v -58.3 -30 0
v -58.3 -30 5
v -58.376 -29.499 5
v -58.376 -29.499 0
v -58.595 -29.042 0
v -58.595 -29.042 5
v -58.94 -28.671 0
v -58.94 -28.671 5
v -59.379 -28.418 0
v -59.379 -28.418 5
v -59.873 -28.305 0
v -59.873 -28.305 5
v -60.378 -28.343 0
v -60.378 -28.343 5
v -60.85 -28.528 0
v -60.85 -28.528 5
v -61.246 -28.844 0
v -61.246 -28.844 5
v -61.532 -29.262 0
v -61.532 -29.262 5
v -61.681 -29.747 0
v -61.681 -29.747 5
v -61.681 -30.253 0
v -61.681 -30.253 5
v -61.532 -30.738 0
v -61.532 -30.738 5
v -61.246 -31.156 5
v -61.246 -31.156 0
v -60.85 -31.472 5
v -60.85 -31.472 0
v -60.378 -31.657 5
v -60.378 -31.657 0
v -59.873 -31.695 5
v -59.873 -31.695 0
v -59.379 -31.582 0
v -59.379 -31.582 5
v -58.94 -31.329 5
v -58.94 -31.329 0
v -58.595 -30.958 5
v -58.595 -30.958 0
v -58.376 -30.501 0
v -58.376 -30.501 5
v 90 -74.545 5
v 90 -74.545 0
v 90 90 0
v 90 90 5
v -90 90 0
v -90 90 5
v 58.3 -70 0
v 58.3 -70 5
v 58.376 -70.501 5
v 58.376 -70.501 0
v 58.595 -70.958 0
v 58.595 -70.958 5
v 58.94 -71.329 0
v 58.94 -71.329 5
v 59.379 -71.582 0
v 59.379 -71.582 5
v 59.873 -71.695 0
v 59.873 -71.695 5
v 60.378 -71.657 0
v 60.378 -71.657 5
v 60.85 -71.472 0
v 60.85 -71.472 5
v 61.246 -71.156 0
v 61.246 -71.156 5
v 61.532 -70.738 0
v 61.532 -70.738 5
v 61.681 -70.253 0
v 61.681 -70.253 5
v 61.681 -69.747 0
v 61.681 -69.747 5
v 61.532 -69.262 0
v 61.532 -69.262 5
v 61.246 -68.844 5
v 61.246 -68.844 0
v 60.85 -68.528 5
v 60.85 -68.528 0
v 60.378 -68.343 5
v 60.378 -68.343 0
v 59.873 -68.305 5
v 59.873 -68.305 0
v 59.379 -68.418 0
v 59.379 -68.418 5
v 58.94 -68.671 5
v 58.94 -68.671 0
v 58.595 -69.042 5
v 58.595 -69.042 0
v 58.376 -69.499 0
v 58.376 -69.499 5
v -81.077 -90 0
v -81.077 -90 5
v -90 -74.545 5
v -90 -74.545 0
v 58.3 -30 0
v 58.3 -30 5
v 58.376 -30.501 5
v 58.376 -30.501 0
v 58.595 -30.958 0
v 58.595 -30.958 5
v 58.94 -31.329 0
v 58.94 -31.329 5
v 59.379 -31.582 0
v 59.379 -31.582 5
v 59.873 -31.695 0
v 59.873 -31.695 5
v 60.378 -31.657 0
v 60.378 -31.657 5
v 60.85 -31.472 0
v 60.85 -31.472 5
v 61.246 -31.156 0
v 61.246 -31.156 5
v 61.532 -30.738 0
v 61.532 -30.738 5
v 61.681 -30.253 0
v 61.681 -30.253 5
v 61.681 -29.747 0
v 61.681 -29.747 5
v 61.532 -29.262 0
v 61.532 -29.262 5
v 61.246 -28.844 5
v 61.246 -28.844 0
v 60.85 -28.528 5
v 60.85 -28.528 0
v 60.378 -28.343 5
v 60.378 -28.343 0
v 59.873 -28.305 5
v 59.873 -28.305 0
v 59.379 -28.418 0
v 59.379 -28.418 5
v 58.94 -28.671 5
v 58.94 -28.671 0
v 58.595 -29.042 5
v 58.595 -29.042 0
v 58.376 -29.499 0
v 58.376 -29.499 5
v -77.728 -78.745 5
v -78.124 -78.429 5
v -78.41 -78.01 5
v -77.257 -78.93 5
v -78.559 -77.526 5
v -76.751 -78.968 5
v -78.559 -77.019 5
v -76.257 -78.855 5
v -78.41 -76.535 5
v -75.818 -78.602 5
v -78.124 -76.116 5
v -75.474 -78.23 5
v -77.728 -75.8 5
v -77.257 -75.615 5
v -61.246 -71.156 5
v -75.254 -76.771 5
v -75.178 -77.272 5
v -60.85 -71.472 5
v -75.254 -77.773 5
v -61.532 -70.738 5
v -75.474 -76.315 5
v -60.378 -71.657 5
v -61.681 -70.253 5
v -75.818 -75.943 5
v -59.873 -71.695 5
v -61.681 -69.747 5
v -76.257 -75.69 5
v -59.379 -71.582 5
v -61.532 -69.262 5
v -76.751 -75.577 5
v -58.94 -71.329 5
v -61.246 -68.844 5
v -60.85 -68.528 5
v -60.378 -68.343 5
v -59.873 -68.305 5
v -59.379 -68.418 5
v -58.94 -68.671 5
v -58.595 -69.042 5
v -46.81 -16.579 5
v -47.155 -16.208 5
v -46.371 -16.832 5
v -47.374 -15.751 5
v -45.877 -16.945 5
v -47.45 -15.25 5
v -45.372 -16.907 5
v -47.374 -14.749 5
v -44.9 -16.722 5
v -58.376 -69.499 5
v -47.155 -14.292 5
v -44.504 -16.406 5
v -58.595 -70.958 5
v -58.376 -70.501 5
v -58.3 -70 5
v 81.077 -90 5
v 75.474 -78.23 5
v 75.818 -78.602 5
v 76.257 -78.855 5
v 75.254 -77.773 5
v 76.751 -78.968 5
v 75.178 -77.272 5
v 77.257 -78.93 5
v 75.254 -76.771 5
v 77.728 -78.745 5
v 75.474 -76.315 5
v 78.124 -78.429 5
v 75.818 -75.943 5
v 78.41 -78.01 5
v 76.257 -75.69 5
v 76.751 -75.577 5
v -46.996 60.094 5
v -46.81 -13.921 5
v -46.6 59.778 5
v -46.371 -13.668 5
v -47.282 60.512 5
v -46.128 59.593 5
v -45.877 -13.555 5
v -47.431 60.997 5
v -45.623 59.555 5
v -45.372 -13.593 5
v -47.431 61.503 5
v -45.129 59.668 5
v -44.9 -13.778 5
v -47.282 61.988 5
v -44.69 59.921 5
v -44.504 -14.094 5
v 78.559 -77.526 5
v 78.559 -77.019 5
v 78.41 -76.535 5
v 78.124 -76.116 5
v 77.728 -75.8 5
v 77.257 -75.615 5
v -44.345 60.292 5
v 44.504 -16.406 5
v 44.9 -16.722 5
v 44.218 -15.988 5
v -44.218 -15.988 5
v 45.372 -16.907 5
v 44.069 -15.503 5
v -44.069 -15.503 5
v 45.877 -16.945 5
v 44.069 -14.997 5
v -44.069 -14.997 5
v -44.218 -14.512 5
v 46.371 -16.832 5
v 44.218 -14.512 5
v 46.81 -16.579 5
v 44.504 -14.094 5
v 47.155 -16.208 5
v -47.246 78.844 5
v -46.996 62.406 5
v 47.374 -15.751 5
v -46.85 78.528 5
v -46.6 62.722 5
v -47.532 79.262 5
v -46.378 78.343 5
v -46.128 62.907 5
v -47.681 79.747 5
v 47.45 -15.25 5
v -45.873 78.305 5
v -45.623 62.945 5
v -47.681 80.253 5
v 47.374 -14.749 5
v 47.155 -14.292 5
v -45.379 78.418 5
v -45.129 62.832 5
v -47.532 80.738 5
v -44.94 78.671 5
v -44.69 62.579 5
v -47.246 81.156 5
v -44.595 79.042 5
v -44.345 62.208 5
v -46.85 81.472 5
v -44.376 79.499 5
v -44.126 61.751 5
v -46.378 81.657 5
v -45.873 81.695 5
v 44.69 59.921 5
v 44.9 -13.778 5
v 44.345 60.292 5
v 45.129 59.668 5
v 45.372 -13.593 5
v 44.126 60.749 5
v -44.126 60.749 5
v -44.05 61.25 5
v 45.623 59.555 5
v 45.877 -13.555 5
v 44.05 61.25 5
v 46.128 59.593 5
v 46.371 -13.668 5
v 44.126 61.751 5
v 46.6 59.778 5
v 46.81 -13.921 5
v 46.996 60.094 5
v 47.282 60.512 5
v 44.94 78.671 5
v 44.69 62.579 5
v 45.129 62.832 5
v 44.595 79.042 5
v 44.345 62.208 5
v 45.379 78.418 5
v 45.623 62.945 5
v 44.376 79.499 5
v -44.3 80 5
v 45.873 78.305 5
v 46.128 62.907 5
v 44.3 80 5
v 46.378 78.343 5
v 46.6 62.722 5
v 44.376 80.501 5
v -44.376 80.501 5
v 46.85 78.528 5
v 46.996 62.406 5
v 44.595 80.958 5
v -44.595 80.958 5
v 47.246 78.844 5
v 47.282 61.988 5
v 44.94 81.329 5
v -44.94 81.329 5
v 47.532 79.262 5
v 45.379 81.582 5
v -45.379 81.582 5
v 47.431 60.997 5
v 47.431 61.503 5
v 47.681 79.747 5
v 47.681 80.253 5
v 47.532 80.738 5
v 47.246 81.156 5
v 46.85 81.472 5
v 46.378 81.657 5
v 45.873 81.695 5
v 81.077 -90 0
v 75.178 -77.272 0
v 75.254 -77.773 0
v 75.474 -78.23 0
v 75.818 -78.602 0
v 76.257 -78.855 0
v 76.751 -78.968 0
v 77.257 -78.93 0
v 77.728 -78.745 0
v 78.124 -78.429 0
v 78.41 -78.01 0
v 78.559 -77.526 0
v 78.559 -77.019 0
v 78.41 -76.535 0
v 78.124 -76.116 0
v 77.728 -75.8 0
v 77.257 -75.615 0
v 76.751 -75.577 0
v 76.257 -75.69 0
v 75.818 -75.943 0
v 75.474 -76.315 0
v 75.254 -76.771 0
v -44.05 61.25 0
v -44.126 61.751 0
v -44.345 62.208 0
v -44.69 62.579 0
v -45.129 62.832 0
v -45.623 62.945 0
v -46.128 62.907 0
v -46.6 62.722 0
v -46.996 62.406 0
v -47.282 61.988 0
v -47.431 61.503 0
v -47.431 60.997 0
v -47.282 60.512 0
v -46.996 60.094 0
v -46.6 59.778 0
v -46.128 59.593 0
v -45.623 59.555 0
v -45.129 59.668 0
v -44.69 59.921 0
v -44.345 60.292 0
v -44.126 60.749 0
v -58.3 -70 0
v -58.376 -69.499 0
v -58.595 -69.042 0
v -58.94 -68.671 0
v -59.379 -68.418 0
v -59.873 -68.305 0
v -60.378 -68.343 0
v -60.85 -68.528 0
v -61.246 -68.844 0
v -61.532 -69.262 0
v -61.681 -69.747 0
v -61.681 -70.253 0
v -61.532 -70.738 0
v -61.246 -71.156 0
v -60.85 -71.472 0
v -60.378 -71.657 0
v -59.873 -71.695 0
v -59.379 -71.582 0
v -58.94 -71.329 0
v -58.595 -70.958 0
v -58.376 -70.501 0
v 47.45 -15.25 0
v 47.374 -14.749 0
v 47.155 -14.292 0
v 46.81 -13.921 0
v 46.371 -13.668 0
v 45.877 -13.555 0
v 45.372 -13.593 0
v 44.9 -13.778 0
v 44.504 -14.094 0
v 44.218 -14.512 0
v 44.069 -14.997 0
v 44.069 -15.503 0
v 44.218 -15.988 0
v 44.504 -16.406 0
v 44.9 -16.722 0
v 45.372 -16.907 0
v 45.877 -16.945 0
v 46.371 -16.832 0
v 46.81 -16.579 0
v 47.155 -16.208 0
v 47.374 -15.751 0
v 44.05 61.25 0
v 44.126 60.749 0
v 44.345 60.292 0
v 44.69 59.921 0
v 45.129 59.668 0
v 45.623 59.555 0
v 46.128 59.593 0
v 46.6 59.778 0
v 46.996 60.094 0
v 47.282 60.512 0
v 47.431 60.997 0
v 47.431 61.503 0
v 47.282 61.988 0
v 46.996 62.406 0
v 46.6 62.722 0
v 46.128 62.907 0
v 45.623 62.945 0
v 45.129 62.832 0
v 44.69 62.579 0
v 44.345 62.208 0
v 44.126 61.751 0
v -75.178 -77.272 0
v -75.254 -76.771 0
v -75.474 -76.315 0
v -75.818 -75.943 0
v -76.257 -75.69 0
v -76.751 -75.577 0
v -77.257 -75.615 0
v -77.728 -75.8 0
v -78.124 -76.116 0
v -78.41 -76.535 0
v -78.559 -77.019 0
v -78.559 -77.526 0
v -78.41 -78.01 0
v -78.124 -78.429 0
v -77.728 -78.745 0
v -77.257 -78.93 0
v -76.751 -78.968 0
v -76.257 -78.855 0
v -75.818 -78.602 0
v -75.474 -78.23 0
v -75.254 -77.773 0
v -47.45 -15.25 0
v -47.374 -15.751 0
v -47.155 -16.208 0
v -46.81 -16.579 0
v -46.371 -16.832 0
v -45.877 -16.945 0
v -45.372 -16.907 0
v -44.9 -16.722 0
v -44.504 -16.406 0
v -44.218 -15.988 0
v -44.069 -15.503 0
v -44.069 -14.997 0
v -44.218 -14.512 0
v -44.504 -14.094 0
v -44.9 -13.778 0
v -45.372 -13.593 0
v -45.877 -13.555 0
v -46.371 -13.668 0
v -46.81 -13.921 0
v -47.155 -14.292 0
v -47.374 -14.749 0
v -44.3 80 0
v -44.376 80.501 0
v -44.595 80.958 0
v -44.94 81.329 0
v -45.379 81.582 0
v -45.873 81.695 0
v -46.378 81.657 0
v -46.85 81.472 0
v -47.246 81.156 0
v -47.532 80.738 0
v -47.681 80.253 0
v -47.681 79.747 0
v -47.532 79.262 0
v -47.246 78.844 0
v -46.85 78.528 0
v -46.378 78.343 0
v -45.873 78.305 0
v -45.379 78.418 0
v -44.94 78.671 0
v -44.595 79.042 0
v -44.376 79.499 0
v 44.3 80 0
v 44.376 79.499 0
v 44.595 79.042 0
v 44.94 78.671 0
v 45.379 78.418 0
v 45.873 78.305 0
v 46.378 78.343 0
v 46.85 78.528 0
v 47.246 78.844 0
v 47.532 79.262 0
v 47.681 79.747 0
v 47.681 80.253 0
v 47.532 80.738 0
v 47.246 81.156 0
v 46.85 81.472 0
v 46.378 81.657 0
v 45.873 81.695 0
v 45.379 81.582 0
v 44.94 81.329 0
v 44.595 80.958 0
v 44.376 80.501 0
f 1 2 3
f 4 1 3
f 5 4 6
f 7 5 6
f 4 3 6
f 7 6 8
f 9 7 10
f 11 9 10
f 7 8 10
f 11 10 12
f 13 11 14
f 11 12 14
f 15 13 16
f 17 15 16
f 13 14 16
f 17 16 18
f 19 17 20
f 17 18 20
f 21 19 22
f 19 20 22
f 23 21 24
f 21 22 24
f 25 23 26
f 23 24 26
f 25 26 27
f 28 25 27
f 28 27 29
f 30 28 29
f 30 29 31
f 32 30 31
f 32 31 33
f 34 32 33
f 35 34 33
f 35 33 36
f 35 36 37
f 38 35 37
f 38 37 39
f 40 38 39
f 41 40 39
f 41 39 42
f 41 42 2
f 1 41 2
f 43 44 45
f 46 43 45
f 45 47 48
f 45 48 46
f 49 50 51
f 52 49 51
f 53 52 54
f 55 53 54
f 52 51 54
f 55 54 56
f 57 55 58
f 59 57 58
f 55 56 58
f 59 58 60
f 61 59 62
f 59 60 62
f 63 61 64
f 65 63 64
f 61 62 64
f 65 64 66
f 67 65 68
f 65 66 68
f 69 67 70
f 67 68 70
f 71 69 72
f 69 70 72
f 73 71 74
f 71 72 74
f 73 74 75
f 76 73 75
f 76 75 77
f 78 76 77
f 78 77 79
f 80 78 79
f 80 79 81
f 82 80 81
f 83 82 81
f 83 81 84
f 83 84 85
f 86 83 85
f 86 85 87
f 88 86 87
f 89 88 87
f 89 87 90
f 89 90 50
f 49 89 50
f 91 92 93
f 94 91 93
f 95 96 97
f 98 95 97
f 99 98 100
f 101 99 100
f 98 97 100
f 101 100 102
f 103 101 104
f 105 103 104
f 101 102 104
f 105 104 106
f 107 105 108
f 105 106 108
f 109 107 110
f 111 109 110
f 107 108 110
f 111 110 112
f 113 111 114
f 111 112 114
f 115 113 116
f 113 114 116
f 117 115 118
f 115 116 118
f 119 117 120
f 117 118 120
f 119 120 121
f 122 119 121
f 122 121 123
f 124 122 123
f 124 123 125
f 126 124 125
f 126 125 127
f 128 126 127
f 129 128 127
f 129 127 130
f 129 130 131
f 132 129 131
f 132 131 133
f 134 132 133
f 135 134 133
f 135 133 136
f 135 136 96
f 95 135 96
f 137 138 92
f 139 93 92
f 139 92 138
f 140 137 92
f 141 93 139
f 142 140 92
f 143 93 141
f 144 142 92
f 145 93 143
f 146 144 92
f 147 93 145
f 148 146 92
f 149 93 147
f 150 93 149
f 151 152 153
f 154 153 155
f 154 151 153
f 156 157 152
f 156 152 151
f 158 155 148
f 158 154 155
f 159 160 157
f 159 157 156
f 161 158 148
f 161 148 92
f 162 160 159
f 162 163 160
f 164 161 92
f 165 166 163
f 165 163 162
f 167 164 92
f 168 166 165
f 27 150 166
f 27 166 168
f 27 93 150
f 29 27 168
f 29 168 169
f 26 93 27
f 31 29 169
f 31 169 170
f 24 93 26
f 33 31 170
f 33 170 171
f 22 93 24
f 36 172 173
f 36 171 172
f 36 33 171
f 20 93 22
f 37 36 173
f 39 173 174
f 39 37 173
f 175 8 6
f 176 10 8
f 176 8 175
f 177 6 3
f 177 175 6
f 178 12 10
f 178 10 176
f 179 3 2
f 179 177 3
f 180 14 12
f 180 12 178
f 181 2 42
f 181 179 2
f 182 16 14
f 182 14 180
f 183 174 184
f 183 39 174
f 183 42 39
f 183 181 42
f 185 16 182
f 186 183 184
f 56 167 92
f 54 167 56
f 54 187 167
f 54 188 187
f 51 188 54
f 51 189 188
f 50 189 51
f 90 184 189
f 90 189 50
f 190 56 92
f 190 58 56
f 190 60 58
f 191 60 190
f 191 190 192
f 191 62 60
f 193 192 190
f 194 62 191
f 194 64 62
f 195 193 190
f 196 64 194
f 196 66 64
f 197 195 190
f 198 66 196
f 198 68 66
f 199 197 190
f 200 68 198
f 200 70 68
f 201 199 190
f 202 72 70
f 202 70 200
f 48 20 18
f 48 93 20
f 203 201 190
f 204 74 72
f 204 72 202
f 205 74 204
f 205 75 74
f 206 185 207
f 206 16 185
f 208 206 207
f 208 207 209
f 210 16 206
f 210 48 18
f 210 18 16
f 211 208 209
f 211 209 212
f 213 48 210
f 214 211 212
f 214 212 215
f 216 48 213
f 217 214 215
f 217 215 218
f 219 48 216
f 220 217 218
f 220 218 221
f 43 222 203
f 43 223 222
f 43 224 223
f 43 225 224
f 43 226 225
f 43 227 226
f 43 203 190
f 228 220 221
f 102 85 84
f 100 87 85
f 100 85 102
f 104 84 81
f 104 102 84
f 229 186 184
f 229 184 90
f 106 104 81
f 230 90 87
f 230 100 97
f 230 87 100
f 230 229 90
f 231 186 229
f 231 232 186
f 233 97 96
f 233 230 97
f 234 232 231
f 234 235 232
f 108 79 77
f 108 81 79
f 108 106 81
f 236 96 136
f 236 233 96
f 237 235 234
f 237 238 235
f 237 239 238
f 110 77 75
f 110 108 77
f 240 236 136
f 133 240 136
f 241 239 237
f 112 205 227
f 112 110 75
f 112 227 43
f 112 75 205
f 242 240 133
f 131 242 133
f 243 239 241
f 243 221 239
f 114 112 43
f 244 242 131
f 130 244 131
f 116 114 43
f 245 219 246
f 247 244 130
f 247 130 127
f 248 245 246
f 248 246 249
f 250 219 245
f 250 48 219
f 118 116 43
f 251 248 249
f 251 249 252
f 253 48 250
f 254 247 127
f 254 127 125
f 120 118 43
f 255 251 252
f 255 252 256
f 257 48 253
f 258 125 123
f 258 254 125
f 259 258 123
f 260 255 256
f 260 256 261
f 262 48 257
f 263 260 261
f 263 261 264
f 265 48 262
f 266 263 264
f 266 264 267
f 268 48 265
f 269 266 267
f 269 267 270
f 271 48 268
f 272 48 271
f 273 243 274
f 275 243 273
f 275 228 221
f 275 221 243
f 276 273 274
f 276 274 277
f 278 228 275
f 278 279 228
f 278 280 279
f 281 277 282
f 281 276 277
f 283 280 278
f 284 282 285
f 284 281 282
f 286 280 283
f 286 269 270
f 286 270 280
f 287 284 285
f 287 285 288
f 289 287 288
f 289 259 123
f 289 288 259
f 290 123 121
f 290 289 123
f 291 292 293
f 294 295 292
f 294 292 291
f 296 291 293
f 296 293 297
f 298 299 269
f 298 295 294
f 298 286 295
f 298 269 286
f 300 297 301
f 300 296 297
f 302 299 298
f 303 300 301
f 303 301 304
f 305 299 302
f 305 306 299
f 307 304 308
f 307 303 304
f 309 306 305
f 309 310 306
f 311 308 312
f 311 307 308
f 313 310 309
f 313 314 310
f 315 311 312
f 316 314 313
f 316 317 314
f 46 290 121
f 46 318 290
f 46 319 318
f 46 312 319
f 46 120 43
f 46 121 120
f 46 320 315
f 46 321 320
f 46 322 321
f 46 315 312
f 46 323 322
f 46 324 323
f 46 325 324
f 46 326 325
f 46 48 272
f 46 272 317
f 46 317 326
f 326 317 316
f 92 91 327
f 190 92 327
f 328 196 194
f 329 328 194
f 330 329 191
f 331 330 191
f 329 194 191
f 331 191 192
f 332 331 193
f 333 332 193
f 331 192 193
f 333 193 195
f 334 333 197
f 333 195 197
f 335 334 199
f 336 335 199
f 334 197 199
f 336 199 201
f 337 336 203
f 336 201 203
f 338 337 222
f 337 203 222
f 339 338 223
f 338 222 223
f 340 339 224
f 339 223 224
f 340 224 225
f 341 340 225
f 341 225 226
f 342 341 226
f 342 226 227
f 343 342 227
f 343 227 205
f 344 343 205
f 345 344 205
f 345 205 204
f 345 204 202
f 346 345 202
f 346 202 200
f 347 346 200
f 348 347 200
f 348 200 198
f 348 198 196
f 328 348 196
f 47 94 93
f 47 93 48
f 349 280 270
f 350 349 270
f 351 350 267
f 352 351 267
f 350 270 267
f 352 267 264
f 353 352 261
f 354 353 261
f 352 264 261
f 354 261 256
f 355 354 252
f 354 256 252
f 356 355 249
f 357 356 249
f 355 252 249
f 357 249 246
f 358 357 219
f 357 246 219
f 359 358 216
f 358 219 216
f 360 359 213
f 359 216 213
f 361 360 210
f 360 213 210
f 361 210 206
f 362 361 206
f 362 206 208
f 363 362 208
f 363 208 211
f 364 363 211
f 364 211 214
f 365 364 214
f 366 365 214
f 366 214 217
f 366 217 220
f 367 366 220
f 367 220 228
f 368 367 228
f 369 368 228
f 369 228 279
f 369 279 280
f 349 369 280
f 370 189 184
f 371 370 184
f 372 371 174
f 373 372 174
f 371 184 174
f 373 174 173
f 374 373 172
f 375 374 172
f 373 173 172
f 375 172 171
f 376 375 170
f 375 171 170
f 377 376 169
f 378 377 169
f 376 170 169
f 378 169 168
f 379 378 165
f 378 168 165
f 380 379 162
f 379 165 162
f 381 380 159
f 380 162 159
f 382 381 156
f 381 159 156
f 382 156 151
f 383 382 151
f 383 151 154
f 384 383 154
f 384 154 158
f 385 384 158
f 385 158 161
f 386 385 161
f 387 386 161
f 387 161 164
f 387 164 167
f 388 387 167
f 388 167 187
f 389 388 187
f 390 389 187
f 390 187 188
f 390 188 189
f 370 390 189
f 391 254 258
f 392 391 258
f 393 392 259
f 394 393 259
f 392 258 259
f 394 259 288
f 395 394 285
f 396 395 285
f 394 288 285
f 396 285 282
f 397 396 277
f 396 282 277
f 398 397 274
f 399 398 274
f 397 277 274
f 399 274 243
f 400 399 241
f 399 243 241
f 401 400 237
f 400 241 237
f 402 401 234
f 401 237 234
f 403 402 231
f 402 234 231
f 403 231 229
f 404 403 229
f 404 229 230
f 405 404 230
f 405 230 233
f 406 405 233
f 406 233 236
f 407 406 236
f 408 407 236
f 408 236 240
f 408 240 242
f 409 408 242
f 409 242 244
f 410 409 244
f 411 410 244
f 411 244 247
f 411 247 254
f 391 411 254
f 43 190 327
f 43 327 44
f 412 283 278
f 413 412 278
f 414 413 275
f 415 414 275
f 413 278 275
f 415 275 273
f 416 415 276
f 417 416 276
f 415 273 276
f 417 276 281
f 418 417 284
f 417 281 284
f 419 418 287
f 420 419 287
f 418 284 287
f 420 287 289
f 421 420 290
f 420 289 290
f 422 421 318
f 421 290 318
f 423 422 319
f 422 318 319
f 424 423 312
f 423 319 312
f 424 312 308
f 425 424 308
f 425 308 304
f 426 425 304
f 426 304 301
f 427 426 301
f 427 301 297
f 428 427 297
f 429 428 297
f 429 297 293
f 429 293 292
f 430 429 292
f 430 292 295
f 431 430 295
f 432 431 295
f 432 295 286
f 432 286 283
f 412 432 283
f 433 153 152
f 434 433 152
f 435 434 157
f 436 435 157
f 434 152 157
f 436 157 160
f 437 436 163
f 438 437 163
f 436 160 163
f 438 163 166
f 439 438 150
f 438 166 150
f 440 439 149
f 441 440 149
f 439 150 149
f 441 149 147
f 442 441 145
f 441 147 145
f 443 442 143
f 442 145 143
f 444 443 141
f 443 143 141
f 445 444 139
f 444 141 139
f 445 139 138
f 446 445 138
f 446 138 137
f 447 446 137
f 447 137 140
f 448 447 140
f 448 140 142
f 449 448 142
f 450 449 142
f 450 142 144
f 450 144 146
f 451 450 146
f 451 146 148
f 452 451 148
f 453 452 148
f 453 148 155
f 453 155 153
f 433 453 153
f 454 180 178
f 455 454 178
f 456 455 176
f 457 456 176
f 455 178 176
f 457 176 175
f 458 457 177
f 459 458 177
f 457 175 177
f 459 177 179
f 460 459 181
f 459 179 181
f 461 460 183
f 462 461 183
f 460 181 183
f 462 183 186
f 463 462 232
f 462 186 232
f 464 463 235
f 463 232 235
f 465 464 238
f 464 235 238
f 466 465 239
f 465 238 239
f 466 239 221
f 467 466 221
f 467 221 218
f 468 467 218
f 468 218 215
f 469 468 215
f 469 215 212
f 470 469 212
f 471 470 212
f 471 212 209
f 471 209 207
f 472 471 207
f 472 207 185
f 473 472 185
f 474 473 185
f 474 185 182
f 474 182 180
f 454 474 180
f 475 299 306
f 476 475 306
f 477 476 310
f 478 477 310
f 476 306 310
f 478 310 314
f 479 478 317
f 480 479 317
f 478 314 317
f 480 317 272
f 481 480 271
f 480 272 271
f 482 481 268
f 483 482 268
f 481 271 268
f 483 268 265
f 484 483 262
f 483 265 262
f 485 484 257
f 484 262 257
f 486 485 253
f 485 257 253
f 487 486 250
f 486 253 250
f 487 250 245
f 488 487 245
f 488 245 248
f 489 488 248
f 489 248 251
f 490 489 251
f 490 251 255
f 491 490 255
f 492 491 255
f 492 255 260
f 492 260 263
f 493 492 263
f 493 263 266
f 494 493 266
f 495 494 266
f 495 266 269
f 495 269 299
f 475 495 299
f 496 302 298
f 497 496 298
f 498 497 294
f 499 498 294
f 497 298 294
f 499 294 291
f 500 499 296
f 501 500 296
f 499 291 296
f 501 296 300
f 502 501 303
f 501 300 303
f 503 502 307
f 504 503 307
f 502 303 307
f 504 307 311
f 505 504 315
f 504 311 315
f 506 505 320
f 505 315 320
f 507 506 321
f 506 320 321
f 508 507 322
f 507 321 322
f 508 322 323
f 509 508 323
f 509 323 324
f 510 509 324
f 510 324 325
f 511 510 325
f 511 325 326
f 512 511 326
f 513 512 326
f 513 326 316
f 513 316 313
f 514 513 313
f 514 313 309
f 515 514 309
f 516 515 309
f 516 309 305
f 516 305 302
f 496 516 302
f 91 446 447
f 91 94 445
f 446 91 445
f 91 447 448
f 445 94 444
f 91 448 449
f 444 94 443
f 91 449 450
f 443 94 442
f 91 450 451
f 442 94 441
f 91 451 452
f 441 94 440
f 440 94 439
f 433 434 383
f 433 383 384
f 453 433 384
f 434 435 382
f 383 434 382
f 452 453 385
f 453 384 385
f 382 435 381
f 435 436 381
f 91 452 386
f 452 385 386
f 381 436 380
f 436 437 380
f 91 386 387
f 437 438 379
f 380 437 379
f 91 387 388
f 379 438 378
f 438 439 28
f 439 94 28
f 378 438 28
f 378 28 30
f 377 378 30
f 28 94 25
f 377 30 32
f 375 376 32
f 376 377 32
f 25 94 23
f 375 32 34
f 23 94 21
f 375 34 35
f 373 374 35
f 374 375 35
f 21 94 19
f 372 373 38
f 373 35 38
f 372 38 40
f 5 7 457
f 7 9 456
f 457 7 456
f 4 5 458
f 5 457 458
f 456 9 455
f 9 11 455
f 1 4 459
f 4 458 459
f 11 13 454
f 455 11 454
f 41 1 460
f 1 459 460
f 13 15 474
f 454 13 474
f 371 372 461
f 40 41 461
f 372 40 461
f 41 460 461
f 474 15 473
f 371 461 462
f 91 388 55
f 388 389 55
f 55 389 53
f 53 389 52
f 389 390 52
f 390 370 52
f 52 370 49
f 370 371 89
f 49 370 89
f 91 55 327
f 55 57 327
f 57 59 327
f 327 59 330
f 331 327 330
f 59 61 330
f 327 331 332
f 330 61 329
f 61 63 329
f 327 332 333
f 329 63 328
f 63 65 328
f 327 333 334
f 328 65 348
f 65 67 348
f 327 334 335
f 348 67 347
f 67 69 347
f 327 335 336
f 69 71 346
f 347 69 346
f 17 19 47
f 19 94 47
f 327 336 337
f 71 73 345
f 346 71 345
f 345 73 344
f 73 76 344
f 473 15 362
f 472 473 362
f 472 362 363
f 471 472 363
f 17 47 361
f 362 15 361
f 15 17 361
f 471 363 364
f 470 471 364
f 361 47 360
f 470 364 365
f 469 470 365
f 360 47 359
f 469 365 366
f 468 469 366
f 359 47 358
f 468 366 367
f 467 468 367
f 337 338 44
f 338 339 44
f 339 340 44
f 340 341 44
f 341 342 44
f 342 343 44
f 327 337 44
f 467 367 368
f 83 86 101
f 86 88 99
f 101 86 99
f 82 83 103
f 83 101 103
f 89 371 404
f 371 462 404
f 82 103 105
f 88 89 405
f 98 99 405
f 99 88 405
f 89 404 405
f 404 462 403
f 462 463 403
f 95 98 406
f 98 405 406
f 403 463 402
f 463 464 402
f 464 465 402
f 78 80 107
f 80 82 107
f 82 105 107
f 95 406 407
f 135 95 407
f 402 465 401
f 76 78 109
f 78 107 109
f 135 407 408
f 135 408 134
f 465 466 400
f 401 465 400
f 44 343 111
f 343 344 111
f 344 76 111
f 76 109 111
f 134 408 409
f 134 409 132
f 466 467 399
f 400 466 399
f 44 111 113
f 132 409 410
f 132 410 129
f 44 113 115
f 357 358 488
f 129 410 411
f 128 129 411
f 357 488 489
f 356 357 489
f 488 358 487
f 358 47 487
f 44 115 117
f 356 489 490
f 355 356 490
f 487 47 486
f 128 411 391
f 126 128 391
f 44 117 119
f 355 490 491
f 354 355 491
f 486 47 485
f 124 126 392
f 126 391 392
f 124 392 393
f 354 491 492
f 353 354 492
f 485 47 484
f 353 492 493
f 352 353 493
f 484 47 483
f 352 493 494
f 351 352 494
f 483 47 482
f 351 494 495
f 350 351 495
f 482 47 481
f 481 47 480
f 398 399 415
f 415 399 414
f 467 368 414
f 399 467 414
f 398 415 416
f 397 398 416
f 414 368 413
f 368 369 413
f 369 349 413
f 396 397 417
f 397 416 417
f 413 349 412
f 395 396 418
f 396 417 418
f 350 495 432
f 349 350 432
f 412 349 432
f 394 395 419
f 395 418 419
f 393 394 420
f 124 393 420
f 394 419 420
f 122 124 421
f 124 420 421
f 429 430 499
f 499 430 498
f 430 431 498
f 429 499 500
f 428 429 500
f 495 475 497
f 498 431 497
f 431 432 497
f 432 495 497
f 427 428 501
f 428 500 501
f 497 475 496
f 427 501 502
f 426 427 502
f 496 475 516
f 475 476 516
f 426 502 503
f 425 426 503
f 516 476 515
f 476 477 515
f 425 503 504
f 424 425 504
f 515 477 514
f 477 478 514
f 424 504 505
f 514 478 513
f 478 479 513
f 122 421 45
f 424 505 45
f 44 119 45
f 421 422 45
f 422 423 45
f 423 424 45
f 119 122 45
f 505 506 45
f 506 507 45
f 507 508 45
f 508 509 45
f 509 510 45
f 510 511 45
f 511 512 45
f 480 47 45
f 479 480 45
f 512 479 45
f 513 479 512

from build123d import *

# Parameters (mm, degrees)
SKETCH_1_W          = 180
SKETCH_1_H          = 180
EXTRUDE_1_DEPTH     = 5
SKETCH_2_R          = 1.7
CUT_EXTRUDE_1_DEPTH = 128.377392029
CUT_EXTRUDE_2_DEPTH = 128.377392029
SKETCH_4_R          = 1.7
CUT_EXTRUDE_3_DEPTH = 128.377392029
SKETCH_5_R          = 1.7
CUT_EXTRUDE_4_DEPTH = 128.377392029
SKETCH_6_R          = 1.7
CUT_EXTRUDE_5_DEPTH = 128.377392029


with BuildPart() as part:
    # 草圖1 → 填料-伸長1 (new body)
    with BuildSketch(Plane.XY):
        Rectangle(SKETCH_1_W, SKETCH_1_H)
    extrude(amount=EXTRUDE_1_DEPTH)

    # 草圖2 → 除料-伸長1 (cut, through all)
    with BuildSketch(Plane.XY.offset(5)):
        with Locations((-46, 80)):
            Circle(SKETCH_2_R)
        with Locations(Location((46, 80, 0), (0, 0, 180))):
            Circle(SKETCH_2_R)
    extrude(amount=-CUT_EXTRUDE_1_DEPTH, mode=Mode.SUBTRACT)

    # 草圖3 → 除料-伸長2 (cut, through all)
    with BuildSketch(Plane.XY.offset(5)):
        Polygon((-90, -90), (-81.076951546, -90), (-90, -74.544826719), align=None)
        Polygon((90, -90), (81.076951546, -90), (90, -74.544826719), align=None)
    extrude(amount=-CUT_EXTRUDE_2_DEPTH, mode=Mode.SUBTRACT)

    # 草圖4 → 除料-伸長3 (cut, through all)
    with BuildSketch(Plane.XY.offset(5)):
        with Locations((-76.878221735, -77.27241336)):
            Circle(SKETCH_4_R)
        with Locations(Location((76.878221735, -77.27241336, 0), (0, 0, 180))):
            Circle(SKETCH_4_R)
    extrude(amount=-CUT_EXTRUDE_3_DEPTH, mode=Mode.SUBTRACT)

    # 草圖5 → 除料-伸長4 (cut, through all)
    with BuildSketch(Plane.XY.offset(5)):
        with Locations((-45.75, 61.25)):
            Circle(SKETCH_5_R)
        with Locations(Location((45.75, 61.25, 0), (0, 0, 180))):
            Circle(SKETCH_5_R)
        with Locations((45.75, -15.25)):
            Circle(SKETCH_5_R)
        with Locations(Location((-45.75, -15.25, 0), (0, 0, 180))):
            Circle(SKETCH_5_R)
    extrude(amount=-CUT_EXTRUDE_4_DEPTH, mode=Mode.SUBTRACT)

    # 草圖6 → 除料-伸長5 (cut, through all)
    with BuildSketch(Plane.XY.offset(5)):
        with Locations((-60, -30)):
            Circle(SKETCH_6_R)
        with Locations((-60, -70)):
            Circle(SKETCH_6_R)
        with Locations(Location((60, -70, 0), (0, 0, 180))):
            Circle(SKETCH_6_R)
        with Locations(Location((60, -30, 0), (0, 0, 180))):
            Circle(SKETCH_6_R)
    extrude(amount=-CUT_EXTRUDE_5_DEPTH, mode=Mode.SUBTRACT)


solid = part.part
